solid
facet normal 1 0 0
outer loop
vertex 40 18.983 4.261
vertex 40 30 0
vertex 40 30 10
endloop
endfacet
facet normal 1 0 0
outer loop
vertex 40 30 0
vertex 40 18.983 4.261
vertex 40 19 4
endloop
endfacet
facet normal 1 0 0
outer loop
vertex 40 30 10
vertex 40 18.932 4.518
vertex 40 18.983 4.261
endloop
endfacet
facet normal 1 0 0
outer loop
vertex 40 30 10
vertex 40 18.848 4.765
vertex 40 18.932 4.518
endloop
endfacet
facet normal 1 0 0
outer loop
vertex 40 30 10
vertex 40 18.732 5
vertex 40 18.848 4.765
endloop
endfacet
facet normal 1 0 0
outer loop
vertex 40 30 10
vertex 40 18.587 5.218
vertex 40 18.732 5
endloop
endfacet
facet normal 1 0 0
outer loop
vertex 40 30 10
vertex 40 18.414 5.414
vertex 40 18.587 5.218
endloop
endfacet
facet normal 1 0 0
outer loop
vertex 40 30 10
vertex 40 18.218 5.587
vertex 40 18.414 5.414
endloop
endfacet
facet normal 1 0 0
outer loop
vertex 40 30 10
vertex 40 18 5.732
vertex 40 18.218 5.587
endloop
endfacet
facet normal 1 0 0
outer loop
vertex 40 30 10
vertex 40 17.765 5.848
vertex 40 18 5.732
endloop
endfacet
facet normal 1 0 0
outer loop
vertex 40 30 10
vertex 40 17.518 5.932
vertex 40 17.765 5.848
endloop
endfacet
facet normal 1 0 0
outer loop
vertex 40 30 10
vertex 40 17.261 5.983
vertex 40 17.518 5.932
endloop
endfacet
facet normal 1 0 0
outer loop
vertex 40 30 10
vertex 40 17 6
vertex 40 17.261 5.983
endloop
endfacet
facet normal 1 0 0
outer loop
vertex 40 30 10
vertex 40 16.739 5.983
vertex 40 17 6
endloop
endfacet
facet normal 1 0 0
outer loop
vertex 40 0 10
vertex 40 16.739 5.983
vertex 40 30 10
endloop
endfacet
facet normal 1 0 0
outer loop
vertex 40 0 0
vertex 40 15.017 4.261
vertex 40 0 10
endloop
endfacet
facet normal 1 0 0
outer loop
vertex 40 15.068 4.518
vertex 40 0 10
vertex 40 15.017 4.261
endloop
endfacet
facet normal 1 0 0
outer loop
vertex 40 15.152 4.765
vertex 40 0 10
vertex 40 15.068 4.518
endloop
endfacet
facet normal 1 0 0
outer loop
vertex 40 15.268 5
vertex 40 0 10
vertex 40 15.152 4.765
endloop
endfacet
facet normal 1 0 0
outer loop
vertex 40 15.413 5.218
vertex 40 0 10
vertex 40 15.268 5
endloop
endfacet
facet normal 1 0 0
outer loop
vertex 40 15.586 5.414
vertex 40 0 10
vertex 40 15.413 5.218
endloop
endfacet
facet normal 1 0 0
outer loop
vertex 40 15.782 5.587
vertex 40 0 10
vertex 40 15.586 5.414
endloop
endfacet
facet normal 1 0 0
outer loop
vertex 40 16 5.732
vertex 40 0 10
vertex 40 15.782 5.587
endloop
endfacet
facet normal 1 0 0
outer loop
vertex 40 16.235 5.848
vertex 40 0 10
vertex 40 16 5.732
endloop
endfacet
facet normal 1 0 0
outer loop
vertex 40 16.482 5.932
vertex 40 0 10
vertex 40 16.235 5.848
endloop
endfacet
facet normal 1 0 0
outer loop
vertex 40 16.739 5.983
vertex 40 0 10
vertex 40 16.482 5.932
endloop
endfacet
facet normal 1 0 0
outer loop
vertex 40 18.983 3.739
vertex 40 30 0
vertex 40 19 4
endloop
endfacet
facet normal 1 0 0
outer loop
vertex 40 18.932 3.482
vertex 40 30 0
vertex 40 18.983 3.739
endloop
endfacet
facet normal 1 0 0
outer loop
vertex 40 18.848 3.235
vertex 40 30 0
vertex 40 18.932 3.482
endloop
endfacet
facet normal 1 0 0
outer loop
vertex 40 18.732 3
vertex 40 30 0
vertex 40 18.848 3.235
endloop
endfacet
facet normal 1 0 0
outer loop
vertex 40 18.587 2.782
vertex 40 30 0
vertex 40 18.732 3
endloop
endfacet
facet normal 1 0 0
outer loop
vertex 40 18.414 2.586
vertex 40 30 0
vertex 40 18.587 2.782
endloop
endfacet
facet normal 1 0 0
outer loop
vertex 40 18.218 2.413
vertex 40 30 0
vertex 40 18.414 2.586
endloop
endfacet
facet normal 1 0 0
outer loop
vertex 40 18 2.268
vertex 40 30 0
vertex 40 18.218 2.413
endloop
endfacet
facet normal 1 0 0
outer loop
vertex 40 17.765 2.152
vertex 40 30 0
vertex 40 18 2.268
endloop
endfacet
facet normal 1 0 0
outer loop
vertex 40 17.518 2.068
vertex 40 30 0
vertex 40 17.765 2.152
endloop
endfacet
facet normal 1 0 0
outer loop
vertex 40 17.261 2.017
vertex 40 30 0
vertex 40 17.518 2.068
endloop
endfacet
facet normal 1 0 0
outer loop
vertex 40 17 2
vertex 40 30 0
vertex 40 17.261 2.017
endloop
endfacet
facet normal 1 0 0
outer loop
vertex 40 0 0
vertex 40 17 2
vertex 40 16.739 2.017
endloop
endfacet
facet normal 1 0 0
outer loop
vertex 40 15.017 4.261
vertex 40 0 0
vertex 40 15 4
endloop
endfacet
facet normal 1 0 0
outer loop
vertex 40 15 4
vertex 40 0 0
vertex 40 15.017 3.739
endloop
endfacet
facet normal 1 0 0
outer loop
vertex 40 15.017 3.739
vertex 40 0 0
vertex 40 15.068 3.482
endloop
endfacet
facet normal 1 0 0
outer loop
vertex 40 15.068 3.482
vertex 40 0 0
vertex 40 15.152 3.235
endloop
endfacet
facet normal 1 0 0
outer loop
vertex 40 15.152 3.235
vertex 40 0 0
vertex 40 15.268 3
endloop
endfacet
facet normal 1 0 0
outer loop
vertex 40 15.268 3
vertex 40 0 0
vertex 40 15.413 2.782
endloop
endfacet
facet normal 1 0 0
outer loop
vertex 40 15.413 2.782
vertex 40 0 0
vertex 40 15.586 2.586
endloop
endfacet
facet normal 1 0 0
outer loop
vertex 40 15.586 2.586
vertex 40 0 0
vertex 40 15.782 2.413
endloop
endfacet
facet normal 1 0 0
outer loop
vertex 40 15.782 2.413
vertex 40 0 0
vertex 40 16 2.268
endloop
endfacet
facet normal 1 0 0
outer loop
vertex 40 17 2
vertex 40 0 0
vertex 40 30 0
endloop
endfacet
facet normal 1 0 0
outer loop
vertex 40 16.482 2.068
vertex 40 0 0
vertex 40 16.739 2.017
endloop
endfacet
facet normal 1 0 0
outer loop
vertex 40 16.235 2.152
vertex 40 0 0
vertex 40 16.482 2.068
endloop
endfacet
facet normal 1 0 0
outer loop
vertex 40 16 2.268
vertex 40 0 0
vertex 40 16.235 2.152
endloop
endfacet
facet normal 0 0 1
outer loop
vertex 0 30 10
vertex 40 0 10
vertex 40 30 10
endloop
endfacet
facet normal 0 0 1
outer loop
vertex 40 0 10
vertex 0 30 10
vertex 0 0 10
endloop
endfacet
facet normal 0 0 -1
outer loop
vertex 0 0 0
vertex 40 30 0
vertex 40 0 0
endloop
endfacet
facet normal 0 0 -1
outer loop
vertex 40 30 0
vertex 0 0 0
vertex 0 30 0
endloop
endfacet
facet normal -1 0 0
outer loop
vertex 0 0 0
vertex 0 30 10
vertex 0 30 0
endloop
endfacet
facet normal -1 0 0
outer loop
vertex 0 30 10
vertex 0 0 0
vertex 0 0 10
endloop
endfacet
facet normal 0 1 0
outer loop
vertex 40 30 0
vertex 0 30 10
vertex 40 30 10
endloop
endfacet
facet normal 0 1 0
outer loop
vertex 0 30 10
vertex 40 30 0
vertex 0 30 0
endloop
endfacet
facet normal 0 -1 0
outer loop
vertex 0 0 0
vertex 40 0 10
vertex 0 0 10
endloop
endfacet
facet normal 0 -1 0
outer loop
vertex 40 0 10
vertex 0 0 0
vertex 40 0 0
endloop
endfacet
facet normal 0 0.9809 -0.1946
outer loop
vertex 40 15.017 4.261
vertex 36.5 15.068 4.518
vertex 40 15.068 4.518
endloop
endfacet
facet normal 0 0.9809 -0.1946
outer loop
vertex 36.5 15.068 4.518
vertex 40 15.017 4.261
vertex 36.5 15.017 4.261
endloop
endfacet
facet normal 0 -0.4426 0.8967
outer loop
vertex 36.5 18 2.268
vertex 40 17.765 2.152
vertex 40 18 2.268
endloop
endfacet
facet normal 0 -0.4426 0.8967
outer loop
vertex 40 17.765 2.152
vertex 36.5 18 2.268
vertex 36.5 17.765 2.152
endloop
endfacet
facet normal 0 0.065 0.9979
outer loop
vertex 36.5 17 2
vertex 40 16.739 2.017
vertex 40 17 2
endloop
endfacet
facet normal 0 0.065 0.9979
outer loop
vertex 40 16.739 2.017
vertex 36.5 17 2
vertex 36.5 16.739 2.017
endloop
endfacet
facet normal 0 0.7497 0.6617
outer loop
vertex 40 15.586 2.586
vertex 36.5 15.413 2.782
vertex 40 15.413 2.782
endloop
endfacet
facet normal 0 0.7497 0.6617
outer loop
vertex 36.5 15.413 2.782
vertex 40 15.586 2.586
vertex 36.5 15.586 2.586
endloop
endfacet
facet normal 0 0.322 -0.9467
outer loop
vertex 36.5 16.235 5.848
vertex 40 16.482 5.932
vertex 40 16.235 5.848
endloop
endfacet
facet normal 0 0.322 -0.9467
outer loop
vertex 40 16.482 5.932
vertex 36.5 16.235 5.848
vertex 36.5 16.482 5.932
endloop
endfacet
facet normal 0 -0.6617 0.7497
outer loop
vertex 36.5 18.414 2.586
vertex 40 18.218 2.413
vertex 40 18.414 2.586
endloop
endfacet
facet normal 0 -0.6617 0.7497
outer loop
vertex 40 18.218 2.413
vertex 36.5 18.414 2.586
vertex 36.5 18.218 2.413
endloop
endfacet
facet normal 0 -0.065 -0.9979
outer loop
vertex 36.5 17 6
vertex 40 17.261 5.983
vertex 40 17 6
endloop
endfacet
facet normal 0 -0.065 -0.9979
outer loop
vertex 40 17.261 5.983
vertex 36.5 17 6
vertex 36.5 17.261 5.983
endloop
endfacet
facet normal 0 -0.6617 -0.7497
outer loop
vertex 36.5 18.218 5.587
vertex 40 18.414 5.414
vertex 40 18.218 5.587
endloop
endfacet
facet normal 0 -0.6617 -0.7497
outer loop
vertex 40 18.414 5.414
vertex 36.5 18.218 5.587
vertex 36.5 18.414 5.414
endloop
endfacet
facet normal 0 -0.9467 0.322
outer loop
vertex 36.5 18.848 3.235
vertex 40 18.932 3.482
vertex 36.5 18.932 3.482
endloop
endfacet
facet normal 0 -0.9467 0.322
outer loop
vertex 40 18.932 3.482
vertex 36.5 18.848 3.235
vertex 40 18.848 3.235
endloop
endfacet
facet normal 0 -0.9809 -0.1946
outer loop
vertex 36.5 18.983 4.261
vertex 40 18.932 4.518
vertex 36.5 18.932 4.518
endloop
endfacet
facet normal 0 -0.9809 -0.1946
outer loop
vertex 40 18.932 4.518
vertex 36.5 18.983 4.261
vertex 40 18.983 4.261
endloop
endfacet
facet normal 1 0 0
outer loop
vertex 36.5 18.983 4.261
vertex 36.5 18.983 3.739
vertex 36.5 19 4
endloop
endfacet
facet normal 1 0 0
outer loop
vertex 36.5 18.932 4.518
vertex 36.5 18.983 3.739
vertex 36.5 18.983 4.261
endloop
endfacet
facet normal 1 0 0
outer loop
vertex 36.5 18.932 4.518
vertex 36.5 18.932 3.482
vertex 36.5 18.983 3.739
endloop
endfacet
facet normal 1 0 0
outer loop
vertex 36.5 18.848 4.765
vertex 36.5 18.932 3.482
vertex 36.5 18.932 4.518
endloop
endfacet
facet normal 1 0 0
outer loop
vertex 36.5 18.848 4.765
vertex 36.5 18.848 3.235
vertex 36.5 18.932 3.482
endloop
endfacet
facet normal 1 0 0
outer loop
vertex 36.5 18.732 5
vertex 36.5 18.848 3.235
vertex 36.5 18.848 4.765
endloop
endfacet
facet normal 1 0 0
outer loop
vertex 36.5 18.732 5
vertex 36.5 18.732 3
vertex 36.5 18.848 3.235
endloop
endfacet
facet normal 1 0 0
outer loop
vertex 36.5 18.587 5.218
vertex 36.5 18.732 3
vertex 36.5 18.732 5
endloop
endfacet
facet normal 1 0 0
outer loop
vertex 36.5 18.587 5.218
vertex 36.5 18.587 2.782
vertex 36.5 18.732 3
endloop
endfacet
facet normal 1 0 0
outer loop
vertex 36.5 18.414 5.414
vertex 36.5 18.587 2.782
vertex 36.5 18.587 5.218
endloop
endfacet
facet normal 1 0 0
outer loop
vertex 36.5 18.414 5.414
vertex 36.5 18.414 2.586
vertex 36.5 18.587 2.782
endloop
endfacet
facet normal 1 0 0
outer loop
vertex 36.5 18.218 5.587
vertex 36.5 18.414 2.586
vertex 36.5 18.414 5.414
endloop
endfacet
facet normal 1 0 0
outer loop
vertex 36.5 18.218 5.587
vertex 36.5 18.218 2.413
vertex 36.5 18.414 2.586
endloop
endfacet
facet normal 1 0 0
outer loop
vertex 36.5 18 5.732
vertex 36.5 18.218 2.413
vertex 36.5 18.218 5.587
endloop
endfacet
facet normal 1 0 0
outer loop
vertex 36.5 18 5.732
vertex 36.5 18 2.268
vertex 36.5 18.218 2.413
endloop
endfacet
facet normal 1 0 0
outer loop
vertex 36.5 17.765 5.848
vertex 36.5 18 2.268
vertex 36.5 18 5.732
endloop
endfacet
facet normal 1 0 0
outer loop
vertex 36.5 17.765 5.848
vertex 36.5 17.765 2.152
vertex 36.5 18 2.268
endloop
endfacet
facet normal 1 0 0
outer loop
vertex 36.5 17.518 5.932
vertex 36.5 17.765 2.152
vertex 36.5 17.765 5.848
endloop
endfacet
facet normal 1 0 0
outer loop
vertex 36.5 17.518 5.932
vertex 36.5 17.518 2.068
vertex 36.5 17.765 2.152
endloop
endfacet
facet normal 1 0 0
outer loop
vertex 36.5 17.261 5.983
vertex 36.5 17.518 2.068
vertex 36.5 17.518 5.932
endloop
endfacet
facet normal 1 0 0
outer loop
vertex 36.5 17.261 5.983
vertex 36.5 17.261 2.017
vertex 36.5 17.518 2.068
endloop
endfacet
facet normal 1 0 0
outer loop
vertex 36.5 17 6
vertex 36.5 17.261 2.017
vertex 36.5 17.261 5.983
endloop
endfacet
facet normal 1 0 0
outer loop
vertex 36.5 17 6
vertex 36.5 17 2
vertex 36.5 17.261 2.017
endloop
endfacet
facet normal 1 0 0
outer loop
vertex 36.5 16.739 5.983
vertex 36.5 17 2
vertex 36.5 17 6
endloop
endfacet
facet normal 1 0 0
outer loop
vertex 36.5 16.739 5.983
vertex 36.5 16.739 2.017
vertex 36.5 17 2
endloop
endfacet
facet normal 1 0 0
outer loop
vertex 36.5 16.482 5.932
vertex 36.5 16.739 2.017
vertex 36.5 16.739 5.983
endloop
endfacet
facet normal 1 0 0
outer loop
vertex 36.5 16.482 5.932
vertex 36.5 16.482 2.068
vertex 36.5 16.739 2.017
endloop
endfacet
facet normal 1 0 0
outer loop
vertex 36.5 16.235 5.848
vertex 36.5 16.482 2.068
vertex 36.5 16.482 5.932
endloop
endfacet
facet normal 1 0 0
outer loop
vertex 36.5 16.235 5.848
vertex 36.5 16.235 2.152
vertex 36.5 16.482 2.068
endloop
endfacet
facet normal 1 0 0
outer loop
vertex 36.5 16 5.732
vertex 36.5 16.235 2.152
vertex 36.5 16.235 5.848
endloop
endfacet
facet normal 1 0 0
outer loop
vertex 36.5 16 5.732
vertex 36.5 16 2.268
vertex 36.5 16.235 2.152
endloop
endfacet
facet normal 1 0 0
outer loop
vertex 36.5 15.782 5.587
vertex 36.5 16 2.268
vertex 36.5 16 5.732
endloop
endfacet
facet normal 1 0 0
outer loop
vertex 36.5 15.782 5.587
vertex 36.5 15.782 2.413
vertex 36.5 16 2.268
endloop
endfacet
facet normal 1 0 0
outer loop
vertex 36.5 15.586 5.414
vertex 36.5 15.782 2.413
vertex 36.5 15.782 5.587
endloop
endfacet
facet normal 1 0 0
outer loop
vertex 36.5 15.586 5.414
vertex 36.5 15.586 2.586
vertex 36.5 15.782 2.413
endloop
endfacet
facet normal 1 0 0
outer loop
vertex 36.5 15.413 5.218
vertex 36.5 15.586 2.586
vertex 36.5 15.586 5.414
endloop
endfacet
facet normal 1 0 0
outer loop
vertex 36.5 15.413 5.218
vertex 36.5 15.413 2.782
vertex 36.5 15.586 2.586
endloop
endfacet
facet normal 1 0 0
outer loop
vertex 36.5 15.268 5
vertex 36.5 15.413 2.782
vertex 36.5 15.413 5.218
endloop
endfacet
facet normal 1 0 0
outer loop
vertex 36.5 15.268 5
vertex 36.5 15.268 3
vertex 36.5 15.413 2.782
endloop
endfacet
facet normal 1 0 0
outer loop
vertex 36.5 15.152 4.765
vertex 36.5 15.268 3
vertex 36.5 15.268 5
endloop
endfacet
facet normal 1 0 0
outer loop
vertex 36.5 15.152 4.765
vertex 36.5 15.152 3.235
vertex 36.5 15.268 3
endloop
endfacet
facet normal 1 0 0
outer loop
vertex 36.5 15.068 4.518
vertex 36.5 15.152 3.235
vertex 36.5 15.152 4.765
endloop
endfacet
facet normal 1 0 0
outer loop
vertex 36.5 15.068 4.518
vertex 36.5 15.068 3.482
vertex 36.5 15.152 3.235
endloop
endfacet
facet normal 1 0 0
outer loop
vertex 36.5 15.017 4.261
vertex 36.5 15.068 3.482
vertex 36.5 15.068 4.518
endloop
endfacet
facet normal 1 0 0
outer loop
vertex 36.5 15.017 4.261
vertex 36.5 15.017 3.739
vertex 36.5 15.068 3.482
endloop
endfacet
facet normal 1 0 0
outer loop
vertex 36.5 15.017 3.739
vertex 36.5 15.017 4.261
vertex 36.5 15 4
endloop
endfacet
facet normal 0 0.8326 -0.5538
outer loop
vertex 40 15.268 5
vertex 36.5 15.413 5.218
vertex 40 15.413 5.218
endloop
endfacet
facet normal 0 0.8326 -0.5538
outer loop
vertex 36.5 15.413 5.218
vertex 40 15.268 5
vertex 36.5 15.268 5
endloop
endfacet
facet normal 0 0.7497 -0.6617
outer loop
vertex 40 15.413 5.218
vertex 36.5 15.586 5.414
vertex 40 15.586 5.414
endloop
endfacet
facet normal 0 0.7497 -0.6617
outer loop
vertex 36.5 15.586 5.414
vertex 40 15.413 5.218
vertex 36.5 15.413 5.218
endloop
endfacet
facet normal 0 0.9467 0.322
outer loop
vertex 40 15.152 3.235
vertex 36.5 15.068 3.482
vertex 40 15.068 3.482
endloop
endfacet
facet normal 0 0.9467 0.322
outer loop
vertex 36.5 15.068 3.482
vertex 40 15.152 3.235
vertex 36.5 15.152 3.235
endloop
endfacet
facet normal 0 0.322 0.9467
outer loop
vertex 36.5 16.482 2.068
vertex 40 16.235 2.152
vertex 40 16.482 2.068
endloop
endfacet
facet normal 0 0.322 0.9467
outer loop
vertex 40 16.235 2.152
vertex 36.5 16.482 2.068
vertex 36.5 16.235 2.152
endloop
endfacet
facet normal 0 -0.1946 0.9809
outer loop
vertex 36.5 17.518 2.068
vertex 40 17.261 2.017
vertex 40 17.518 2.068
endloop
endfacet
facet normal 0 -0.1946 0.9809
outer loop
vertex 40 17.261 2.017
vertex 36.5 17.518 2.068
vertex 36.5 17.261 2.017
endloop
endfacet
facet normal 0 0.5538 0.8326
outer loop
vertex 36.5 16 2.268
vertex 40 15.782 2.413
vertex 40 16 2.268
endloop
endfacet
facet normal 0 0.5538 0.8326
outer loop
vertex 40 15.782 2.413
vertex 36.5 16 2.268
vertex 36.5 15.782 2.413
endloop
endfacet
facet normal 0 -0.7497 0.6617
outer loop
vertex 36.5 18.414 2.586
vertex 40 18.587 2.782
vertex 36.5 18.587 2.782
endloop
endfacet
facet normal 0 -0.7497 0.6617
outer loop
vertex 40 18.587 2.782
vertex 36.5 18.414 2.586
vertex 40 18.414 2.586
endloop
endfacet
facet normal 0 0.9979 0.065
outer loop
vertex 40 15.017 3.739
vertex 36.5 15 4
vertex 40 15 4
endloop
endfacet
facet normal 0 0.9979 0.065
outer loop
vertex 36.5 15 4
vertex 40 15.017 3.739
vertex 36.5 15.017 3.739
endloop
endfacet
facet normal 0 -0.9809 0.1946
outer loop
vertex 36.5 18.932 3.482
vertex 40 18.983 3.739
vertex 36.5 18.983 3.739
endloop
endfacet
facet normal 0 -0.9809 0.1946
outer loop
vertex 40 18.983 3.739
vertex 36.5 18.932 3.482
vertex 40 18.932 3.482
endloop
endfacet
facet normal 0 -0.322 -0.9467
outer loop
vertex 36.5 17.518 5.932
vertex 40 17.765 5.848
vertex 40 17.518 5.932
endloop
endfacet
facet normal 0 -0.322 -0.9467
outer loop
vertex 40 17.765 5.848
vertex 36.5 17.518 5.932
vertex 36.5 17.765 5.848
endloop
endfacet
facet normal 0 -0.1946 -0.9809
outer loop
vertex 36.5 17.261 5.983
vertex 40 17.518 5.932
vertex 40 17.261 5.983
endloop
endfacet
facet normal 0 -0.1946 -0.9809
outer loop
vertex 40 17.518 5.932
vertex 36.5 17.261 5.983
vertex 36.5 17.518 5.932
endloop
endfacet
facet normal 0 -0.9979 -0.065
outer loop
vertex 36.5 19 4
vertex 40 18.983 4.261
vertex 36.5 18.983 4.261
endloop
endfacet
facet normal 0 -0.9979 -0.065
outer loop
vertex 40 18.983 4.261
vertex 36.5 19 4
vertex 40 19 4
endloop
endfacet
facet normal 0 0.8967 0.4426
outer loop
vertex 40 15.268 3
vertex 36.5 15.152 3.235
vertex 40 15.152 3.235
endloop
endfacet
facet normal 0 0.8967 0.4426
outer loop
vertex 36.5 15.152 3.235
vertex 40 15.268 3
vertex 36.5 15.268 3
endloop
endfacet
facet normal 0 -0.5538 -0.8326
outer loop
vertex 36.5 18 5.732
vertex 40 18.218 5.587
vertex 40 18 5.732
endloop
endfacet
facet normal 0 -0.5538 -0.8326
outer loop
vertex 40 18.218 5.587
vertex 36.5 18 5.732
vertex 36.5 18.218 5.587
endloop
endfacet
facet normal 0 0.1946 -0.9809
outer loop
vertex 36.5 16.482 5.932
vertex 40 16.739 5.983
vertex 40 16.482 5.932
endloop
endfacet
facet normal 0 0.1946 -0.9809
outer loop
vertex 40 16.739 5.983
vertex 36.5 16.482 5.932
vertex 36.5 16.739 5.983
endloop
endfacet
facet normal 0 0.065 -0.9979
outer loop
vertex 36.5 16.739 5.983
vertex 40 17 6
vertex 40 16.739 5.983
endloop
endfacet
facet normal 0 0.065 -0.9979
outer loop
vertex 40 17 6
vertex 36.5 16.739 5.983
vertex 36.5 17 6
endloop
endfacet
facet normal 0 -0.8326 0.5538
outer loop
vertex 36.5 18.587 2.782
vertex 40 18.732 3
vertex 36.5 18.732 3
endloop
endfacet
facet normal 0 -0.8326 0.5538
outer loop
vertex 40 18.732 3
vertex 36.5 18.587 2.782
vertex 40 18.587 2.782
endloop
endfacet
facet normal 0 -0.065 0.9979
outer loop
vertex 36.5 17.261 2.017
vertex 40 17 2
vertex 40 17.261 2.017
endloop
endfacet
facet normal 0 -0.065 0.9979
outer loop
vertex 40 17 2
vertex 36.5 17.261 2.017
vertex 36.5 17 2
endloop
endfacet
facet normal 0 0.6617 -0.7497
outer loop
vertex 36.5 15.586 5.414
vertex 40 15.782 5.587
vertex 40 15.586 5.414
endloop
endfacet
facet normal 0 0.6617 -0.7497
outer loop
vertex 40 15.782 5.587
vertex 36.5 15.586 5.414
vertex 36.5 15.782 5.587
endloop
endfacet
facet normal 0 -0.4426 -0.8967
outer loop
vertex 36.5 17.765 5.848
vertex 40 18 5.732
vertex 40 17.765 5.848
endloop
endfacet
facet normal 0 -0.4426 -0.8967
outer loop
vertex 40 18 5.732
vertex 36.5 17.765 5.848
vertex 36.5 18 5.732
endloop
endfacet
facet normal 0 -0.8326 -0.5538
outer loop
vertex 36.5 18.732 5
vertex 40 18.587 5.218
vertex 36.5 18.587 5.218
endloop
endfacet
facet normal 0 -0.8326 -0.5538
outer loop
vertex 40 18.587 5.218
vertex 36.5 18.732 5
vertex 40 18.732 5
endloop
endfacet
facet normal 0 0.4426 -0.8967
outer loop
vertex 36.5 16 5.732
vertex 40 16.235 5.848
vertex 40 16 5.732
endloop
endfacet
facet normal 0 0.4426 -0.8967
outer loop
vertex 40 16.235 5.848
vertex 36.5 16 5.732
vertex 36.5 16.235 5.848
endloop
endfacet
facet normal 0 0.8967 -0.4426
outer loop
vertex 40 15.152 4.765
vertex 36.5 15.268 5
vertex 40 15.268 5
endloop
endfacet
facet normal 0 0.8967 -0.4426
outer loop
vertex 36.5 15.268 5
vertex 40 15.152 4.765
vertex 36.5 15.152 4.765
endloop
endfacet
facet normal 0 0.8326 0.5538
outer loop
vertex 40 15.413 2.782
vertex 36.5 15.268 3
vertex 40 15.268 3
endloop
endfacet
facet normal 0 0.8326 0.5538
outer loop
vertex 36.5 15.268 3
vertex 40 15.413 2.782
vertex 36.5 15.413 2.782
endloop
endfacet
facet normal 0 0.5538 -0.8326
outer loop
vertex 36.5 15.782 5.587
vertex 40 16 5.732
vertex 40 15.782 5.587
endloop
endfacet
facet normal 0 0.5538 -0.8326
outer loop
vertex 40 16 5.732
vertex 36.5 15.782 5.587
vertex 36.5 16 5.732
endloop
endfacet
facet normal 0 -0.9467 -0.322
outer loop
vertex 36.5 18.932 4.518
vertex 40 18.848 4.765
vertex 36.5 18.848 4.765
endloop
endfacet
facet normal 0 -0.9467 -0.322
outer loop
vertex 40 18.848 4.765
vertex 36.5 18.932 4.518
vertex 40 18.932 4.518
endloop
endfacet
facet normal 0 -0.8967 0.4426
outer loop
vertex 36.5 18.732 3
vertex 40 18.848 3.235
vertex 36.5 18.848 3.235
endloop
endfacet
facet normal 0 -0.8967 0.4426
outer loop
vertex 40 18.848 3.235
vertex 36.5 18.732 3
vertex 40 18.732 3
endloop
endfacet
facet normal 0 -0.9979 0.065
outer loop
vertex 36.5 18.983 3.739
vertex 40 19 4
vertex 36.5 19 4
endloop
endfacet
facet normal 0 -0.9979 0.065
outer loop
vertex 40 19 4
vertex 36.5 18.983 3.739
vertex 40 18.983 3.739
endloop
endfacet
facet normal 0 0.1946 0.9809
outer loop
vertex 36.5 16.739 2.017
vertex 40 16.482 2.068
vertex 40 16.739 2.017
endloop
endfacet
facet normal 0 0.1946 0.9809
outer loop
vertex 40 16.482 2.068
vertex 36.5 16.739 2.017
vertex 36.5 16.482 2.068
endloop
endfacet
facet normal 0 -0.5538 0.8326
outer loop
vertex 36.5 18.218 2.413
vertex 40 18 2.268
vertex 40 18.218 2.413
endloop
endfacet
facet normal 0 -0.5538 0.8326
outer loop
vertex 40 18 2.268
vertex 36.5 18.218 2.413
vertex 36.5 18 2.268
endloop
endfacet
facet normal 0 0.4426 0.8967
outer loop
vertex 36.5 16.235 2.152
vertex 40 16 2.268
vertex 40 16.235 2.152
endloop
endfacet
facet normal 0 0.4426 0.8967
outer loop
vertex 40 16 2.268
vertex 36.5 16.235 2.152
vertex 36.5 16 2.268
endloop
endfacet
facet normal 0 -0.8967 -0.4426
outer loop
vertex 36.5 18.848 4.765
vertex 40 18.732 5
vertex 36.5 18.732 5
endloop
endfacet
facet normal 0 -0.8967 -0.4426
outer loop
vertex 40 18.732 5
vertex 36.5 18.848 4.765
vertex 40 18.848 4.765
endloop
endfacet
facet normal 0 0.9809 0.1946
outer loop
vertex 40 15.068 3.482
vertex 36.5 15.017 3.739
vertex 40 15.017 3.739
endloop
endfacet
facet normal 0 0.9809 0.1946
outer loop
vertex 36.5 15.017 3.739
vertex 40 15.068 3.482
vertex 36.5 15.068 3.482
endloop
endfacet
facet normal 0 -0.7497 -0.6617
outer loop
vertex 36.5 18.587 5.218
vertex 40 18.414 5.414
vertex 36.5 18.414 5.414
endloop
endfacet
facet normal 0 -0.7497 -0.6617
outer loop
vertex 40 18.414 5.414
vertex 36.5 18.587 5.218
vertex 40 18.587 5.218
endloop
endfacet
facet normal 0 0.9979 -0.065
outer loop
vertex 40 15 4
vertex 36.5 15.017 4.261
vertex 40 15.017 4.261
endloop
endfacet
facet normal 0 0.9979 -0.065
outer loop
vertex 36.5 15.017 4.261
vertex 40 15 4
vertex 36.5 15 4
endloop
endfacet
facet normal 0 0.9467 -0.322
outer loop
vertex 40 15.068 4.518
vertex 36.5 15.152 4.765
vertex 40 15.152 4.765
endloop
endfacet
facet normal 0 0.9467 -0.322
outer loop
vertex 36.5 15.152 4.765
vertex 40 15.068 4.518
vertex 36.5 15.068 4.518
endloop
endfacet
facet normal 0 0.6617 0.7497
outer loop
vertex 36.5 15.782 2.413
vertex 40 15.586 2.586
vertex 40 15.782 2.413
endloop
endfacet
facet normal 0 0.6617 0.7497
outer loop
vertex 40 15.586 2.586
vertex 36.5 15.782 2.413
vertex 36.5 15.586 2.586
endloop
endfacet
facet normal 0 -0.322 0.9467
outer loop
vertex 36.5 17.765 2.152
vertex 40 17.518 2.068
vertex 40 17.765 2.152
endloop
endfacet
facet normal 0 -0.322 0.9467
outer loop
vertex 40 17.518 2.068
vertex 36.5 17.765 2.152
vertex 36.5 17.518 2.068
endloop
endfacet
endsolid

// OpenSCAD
// units=mm — generated by scad_emitter.py
// part=unnamed
$fn = 48;

difference() { cube([40, 30, 10]); translate([40.5, 17, 4]) rotate([0, -90, 0]) cylinder(h=4, r=2, $fn=$fn); }
